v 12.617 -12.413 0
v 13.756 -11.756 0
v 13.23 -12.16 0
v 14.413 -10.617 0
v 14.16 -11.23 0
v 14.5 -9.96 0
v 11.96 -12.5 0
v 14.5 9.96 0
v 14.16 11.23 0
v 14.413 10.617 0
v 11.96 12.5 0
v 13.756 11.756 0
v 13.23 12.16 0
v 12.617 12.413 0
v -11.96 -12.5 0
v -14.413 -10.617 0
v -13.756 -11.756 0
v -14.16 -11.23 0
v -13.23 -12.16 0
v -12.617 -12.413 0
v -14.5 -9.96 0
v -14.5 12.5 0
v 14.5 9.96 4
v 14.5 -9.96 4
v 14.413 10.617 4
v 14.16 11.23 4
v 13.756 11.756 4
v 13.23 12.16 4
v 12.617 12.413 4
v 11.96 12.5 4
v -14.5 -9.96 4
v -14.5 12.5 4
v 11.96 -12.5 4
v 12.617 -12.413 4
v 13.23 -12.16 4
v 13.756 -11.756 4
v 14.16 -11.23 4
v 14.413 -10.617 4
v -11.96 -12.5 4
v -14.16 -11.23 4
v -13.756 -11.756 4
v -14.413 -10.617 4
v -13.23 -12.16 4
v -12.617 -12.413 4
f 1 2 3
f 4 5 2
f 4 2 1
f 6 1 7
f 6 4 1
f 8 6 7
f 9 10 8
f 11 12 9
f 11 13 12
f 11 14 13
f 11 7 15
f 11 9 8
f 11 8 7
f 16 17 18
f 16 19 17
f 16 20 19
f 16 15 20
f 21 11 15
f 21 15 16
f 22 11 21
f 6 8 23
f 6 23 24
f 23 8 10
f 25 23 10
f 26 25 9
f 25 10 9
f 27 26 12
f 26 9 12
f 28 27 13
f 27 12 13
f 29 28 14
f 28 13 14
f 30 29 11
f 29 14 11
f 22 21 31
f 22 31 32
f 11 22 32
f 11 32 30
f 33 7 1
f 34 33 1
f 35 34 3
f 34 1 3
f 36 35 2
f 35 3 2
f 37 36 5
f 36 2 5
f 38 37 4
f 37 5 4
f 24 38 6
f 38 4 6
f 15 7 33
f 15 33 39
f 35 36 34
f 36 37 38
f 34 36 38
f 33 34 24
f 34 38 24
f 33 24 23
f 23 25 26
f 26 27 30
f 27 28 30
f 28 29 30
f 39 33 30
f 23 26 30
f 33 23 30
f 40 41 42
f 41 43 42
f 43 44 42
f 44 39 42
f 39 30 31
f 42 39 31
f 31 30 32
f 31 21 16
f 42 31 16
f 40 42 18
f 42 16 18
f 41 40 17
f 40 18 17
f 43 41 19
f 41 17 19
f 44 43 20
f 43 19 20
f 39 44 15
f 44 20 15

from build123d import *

# Parameters (mm, degrees)
PAD_DEPTH = 4


with BuildPart() as part:
    # Sketch → Pad (new body)
    with BuildSketch(Plane.XY):
        with BuildLine():
            Line((-14.5, 12.5), (11.96, 12.5))
            ThreePointArc((14.5, 9.96), (13.756051, 11.756051), (11.96, 12.5))
            Line((14.5, 9.96), (14.5, -9.96))
            ThreePointArc((11.96, -12.5), (13.756051, -11.756051), (14.5, -9.96))
            Line((11.96, -12.5), (-11.96, -12.5))
            ThreePointArc((-14.5, -9.96), (-13.756051, -11.756051), (-11.96, -12.5))
            Line((-14.5, -9.96), (-14.5, 12.5))
        make_face()
    extrude(amount=PAD_DEPTH)


solid = part.part
